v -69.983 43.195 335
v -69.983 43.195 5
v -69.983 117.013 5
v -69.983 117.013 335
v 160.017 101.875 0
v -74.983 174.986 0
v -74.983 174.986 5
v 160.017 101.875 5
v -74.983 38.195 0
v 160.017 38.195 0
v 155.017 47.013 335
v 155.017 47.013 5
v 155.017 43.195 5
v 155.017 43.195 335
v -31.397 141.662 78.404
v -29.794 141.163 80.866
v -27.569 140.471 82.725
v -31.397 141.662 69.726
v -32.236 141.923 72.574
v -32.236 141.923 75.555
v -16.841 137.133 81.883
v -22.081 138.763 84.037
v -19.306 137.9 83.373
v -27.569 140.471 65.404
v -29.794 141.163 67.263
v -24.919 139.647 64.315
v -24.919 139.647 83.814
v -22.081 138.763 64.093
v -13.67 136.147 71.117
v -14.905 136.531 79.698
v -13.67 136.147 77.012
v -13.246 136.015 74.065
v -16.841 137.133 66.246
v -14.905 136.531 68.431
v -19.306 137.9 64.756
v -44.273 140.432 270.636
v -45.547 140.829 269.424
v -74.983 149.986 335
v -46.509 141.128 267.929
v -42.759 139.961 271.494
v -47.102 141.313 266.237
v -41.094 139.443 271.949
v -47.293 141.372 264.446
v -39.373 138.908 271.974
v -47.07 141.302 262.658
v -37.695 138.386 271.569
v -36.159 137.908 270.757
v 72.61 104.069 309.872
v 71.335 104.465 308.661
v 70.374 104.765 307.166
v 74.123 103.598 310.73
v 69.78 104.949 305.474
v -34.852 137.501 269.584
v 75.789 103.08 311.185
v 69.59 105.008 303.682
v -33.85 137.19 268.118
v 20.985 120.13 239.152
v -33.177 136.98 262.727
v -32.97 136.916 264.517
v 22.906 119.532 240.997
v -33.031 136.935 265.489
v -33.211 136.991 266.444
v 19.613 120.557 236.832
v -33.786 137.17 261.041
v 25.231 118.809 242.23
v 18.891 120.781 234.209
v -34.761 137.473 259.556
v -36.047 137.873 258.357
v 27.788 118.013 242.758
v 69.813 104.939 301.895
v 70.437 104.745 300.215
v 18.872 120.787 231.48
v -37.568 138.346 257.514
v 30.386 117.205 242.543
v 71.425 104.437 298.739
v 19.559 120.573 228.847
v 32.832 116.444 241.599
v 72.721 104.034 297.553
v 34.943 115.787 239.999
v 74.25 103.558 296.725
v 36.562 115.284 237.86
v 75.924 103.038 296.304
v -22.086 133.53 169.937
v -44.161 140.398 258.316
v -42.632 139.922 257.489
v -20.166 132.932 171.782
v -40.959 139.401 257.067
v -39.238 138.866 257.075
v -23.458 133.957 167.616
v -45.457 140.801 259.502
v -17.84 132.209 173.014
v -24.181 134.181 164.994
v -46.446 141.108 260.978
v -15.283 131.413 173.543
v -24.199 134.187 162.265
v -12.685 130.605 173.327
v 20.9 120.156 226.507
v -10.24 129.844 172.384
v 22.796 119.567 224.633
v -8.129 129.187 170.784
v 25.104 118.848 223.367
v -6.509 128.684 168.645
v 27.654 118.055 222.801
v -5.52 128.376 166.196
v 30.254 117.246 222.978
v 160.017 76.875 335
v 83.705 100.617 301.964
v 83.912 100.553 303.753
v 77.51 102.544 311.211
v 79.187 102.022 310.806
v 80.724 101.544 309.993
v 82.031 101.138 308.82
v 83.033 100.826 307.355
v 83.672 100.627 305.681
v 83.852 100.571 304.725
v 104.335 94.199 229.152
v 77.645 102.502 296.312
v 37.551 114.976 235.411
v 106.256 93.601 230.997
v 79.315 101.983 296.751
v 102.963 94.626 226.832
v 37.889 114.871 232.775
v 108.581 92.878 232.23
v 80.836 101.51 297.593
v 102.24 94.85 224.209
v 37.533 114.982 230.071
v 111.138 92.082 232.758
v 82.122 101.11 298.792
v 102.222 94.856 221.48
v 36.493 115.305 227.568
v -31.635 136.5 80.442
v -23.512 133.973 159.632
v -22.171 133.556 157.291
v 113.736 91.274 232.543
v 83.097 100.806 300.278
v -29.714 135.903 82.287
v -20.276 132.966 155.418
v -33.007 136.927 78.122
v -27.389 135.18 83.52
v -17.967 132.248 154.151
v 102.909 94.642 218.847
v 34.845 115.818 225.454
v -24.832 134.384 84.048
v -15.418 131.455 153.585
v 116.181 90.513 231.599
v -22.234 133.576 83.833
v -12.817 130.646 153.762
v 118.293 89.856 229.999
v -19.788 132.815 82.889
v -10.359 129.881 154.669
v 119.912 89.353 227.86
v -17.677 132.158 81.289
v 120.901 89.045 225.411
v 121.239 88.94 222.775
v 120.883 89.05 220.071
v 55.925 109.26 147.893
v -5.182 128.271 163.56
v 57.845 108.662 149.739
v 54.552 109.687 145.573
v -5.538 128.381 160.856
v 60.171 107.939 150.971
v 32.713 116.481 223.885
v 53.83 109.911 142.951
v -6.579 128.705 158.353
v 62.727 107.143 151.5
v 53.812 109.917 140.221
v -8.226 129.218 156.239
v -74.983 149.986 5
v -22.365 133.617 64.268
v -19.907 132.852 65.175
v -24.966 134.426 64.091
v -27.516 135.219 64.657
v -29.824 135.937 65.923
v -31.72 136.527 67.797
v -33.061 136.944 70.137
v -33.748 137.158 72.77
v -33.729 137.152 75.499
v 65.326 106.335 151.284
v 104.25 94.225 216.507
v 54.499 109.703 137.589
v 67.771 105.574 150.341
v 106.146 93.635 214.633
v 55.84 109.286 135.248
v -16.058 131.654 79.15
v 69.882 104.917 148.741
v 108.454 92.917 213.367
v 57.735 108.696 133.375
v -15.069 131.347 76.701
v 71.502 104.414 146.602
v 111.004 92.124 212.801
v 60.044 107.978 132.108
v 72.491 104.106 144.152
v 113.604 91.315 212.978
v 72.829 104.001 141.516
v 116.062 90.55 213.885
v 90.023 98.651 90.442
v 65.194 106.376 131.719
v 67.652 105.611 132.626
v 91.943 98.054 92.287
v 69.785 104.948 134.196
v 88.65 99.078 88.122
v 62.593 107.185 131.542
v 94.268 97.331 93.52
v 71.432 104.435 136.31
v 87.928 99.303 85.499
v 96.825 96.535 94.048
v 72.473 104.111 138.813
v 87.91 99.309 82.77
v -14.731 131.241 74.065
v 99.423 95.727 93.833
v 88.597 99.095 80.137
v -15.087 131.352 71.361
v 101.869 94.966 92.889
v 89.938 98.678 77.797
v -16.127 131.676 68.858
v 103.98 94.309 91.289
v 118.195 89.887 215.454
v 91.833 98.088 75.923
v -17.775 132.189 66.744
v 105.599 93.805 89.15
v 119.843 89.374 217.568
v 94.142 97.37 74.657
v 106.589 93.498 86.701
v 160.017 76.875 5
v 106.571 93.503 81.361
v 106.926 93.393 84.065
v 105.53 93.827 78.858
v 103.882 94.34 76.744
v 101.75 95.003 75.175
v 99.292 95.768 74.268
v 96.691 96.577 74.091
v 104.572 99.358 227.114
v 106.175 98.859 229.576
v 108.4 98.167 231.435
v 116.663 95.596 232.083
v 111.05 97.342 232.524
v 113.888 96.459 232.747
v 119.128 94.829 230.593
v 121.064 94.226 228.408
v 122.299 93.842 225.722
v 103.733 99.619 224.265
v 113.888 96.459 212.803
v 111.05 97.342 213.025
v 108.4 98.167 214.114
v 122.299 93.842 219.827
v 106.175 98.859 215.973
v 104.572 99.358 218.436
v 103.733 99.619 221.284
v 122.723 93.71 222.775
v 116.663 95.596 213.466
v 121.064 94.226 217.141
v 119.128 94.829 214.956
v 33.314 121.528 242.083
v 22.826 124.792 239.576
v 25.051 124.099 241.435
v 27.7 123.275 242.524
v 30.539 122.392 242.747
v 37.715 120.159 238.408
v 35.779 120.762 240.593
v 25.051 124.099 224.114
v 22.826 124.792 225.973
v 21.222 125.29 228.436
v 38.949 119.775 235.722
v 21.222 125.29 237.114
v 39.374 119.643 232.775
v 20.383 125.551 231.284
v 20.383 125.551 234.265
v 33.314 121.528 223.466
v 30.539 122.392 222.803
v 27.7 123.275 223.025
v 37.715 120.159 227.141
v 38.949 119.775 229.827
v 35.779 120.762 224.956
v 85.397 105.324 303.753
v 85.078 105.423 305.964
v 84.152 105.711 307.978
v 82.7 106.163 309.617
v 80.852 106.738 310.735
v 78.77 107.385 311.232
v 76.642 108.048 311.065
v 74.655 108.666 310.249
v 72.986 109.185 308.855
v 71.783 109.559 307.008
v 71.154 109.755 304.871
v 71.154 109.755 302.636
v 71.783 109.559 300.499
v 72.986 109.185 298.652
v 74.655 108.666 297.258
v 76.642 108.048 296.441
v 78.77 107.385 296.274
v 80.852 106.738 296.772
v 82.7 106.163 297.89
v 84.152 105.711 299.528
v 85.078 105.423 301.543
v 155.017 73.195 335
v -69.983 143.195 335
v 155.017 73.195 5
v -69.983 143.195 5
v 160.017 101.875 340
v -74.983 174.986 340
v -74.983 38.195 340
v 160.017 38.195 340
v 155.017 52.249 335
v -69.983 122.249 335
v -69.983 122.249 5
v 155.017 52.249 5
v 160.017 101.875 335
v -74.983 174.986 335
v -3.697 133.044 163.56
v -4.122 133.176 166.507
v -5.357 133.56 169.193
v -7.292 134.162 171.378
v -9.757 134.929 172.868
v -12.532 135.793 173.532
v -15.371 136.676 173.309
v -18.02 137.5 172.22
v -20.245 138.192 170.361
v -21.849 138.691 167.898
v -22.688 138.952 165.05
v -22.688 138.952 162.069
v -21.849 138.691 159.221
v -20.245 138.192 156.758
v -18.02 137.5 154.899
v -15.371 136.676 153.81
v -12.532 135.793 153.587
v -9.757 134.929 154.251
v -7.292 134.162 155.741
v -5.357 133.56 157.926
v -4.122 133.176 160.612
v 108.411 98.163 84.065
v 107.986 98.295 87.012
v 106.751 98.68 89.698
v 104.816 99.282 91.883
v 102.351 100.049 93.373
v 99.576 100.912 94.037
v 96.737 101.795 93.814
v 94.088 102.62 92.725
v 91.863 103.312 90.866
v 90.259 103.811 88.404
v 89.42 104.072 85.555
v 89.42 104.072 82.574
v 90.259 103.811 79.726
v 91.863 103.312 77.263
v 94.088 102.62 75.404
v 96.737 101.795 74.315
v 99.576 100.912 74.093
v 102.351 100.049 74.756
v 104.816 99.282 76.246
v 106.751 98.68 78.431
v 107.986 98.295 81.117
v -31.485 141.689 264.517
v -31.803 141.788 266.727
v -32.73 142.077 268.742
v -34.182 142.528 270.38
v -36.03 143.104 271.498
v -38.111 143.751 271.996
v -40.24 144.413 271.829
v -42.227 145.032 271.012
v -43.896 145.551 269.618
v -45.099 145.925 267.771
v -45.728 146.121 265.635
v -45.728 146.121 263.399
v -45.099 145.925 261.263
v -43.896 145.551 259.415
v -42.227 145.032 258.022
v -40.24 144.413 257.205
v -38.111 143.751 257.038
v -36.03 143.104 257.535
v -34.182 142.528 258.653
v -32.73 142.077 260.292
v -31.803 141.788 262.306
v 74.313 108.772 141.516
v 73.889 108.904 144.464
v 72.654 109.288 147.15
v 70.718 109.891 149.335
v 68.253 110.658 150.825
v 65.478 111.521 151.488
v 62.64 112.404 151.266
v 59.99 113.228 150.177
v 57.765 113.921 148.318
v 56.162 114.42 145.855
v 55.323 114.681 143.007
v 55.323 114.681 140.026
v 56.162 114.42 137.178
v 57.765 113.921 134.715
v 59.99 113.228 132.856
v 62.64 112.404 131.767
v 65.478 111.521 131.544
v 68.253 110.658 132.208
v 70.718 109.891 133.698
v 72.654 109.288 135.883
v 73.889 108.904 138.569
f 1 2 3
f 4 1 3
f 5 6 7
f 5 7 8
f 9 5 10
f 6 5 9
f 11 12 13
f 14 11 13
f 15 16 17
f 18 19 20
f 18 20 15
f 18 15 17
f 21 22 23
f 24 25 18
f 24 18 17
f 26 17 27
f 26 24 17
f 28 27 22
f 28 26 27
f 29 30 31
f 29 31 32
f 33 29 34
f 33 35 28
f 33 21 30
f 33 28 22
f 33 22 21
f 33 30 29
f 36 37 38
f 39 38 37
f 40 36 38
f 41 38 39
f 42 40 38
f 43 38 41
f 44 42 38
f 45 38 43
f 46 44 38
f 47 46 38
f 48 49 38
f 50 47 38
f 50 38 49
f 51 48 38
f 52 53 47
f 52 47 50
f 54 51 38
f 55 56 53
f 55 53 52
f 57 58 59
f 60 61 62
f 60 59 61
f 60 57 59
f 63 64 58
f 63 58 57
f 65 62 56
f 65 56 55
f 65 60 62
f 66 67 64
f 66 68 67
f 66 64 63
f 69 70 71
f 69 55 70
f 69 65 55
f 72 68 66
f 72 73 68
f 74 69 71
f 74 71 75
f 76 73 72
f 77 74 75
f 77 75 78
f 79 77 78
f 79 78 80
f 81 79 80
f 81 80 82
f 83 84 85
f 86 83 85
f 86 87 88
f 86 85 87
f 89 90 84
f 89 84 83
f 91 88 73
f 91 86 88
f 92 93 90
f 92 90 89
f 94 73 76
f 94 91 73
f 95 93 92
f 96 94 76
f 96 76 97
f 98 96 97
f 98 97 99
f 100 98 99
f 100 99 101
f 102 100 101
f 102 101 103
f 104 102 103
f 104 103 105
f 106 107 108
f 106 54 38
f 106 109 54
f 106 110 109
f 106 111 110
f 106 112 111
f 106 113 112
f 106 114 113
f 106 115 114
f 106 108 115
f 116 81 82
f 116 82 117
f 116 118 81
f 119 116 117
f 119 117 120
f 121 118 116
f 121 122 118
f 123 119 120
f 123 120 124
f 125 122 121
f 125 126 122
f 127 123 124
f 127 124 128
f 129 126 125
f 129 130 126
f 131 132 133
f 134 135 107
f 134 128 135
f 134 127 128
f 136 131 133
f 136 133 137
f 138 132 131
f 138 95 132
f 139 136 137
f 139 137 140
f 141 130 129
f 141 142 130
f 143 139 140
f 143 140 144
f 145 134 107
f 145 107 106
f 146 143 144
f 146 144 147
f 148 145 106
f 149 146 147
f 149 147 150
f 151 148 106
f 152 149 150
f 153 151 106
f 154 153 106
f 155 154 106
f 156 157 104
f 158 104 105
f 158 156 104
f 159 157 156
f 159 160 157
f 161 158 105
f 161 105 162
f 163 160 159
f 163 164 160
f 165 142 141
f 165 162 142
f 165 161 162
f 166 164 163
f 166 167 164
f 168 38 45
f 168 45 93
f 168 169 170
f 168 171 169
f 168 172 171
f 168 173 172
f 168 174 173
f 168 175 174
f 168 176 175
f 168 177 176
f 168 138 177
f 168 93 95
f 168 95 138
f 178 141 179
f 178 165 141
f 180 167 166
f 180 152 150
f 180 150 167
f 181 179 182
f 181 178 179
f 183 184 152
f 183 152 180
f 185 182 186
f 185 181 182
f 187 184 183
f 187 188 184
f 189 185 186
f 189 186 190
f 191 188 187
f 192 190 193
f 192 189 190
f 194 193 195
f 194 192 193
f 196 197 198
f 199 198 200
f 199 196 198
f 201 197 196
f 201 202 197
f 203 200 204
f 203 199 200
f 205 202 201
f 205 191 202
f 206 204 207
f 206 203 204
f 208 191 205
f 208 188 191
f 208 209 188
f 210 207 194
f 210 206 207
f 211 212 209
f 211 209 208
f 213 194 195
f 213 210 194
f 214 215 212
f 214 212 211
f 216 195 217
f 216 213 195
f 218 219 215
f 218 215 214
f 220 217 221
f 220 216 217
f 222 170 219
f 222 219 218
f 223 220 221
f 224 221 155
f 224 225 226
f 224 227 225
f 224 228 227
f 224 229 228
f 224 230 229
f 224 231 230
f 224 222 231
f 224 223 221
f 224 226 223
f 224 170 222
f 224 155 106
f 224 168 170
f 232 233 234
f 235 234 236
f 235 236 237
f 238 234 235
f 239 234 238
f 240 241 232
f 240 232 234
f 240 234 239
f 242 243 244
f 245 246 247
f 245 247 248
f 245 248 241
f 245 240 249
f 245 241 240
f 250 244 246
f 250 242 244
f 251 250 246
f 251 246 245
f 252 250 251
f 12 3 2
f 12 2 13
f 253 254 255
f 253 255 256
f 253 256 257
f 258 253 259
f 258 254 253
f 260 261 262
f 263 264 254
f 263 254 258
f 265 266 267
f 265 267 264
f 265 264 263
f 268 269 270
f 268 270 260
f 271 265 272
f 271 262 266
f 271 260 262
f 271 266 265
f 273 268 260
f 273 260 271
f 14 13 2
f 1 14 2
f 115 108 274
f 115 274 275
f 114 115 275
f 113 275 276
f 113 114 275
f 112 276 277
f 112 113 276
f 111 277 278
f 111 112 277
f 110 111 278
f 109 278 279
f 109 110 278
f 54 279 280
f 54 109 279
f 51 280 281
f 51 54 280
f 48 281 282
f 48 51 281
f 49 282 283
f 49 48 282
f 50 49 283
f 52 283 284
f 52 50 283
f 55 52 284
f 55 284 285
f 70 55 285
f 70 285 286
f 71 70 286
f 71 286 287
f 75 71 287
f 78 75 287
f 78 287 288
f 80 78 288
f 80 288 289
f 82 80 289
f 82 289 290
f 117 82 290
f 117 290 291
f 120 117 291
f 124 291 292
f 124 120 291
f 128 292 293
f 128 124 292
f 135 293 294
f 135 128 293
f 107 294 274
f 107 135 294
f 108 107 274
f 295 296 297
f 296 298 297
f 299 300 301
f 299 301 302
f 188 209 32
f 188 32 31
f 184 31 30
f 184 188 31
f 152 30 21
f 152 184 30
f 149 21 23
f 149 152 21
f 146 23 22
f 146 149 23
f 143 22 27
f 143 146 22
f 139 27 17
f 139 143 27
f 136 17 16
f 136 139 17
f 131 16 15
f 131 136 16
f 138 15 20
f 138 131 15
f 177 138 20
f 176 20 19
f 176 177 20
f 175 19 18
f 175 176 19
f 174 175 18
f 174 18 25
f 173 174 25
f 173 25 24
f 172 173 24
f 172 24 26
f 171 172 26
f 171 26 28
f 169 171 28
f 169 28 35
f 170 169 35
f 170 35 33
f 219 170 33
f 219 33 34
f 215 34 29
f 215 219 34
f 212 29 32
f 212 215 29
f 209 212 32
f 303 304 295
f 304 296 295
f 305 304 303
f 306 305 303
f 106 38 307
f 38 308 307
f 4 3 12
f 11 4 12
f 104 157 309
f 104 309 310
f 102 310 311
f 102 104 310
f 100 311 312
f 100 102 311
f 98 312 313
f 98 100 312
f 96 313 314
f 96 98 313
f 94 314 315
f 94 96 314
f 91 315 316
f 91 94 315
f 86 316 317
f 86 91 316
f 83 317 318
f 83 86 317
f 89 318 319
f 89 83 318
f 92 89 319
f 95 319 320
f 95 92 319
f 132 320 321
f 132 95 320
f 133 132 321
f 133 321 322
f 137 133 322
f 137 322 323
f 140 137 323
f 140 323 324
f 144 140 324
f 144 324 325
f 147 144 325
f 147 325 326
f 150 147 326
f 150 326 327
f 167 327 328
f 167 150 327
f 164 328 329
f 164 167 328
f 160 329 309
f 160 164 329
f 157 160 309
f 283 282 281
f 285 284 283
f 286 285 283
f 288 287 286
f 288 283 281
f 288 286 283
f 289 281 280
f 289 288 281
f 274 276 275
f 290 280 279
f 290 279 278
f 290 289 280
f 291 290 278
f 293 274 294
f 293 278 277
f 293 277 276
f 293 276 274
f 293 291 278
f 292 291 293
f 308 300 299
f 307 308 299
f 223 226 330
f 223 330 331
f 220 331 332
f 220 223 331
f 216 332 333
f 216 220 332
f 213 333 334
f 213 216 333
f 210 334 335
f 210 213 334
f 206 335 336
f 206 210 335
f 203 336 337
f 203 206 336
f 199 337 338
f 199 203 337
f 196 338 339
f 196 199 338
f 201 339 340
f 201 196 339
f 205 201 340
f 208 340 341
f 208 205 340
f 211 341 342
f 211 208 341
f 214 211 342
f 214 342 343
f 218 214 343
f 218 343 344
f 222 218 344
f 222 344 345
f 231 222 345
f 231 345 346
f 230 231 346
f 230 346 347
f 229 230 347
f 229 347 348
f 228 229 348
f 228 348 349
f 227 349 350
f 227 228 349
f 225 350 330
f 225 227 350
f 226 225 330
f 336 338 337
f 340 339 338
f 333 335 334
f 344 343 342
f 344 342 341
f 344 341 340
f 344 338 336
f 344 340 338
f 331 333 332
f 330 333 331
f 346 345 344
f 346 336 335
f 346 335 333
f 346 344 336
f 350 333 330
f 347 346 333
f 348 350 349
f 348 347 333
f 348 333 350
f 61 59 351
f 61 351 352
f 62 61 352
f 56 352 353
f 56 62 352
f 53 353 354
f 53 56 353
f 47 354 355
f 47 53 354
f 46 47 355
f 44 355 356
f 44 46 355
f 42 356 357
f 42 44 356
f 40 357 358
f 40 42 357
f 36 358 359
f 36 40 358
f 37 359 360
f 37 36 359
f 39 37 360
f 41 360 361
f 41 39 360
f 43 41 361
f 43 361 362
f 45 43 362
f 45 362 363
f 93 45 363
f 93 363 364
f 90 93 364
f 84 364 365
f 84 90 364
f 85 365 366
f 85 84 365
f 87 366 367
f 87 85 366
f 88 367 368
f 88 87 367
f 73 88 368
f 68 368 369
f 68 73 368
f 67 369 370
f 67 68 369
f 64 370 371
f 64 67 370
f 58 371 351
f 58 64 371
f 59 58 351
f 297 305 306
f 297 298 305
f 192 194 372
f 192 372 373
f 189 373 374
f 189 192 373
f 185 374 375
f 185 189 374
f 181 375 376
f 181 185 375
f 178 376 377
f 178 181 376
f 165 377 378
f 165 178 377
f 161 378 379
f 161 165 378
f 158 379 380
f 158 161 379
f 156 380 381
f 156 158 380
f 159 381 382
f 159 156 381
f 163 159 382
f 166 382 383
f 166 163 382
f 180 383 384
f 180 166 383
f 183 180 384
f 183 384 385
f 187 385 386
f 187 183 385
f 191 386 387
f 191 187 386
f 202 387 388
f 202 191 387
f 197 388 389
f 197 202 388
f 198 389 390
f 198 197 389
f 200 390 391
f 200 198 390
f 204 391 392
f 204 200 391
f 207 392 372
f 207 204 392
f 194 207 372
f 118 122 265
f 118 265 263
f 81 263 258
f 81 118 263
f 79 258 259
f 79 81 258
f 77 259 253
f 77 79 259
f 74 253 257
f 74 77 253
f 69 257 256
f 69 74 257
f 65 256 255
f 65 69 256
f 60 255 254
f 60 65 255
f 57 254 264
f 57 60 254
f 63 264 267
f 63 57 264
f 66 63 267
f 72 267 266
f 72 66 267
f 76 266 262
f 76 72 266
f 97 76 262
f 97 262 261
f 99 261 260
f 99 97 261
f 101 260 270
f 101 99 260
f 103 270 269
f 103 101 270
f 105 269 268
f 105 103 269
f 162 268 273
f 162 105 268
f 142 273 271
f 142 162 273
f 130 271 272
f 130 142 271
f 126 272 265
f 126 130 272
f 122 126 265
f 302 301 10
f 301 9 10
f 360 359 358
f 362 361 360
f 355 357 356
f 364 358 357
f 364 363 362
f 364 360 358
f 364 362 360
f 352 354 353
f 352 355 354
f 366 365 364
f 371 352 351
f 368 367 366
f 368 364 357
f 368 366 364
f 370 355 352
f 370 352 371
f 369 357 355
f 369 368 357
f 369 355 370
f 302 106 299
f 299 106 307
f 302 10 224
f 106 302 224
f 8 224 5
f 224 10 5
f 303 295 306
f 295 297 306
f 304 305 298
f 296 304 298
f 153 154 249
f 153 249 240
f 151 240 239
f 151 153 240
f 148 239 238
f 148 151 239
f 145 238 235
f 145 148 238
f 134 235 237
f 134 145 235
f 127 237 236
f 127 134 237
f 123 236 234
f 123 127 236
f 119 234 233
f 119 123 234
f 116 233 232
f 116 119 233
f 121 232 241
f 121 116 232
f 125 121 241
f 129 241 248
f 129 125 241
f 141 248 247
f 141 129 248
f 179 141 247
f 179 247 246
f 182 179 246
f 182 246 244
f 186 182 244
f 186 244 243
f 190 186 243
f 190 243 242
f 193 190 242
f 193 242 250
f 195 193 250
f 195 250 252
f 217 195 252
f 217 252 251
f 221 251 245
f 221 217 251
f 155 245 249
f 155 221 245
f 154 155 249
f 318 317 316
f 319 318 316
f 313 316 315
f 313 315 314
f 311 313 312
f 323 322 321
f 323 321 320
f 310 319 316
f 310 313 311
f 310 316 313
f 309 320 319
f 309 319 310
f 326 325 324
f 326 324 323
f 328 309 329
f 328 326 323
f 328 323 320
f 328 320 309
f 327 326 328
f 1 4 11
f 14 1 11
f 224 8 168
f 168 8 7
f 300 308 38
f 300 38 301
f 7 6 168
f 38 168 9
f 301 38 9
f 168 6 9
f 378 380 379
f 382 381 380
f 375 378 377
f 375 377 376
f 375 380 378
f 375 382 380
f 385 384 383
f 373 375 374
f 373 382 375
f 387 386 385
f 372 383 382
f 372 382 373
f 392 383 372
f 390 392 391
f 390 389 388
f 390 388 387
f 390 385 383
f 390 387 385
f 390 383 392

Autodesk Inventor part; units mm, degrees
ref_plane "YZ Plane" through (0, 0, 0) normal (1, 0, 0) x (0, 1, 0)
ref_plane "XZ Plane" through (0, 0, 0) normal (0, 1, 0) x (-1, 0, 0)
ref_plane "XY Plane" through (0, 0, 0) normal (0, 0, 1) x (1, 0, 0)
sketch "Sketch1" plane through (0, 0, 0) normal (0, 0, 1) x (1, 0, 0)
  line L0 (-69.9828, 73.1946) -> (155.0172, 73.1946)
  line L1 (155.0172, 73.1946) -> (155.0172, 43.1946)
  line L2 (155.0172, 43.1946) -> (-69.9828, 43.1946)
  line L3 (-69.9828, 43.1946) -> (-69.9828, 73.1946)
  line L4 (-69.9828, 73.1946) -> (-69.9828, 143.1946)
  line L5 (-69.9828, 143.1946) -> (155.0172, 73.1946)
  line L6 (-74.9828, 93.1946) -> (-74.9828, 38.1946)
  line L7 (-74.9828, 38.1946) -> (160.0172, 38.1946)
  line L8 (160.0172, 38.1946) -> (160.0172, 76.8754)
  line L9 (-74.9828, 73.1946) -> (-74.9828, 149.9865)
  line L10 (-74.9828, 149.9865) -> (160.0172, 76.8754)
  line L11 (-69.9828, 143.1946) -> (-74.9828, 143.1946)
  line L12 (155.0172, 73.1946) -> (160.0172, 73.1946)
  line L13 (-69.9828, 73.1946) -> (-74.9828, 73.1946)
  point P0 (0, 0)
  point P1 (-74.9828, 93.1946)
  dimension "d0" = 225
  dimension "d1" = 30
  dimension "d2" = 70
  dimension "d3" = 5
  dimension "d4" = 5
  dimension "d32" = 5
extrude "Extrusion1" add sketch "Sketch1" along normal blind 340 contours L13 L6 L9 L11 L4 | L3 L2 L1 L12 L8 L7 L6 L13 | L5 L11 L9 L10 L8 L12
extrude "Extrusion2" add sketch "Sketch1" along normal blind 340 contours L4 L5 L0 | L0 L1 L2 L3
extrude "Extrusion3" cut sketch "Sketch1" along normal blind 335 contours L4 L5 L0 | L0 L1 L2 L3
extrude "Extrusion4" add sketch "Sketch1" along normal blind 5 contours L4 L5 L0 | L0 L1 L2 L3
sketch "Sketch2" plane through (-74.9828, 149.9865, 340) normal (0.2971, 0.9549, 0) x (0.9549, -0.2971, 0)
  line L0 (36.4986, 335) -> (36.4986, 5) projected
  circle A0 centre (36.4986, 75.4833) radius 7.5
  circle A1 centre (53.1004, 265.9353) radius 10
  circle A2 centre (108.208, 107.2253) radius 10
  circle A3 centre (63.1004, 176.4405) radius 10
  circle A4 centre (158.9071, 36.2466) radius 7.5
  circle A5 centre (180.5093, 255.9353) radius 10
  circle A6 centre (144.7995, 198.4836) radius 10
  circle A7 centre (195.4985, 117.2253) radius 10
  point P0 (116.1538, 340)
  dimension "d13" = 15
  dimension "d14" = 20
  dimension "d15" = 20
  dimension "d16" = 20
  dimension "d17" = 15
  dimension "d18" = 20
  dimension "d19" = 20
  dimension "d20" = 20
extrude "Extrusion5" add sketch "Sketch2" along normal blind 5
sketch "Sketch3" plane through (0, 0, 340) normal (0, 0, 1) x (1, 0, 0)
  line L0 (-69.9828, 143.1946) -> (158.5319, 72.1011)
  line L1 (160.0172, 76.8754) -> (-74.9828, 149.9865) projected
  line L2 (-75.9241, 124.0974) -> (155.0172, 52.249)
  line L3 (-69.9828, 143.1946) -> (-69.9828, 122.249)
  line L4 (-69.9828, 43.1946) -> (-69.9828, 143.1946) projected
  line L5 (155.0172, 43.1946) -> (155.0172, 73.1946) projected
  line L6 (155.0172, 73.1946) -> (155.0172, 52.249)
  line L7 (-74.9828, 149.9865) -> (-74.9828, 174.9865)
  line L8 (-74.9828, 174.9865) -> (160.0172, 101.8754)
  line L9 (-69.9828, 143.1946) -> (155.0172, 73.1946) projected
  line L10 (160.0172, 76.8754) -> (160.0172, 101.8754)
  line L11 (-77.4095, 119.3231) -> (160.0172, 45.4571)
  line L12 (160.0172, 45.4571) -> (160.0172, 93.1946)
  line L13 (-69.9828, 122.249) -> (-69.9828, 117.0126)
  line L14 (155.0172, 52.249) -> (155.0172, 47.0126)
  point P0 (0, 0)
  dimension "d23" = 20
  dimension "d24" = 25
  dimension "d25" = 5
extrude "Extrusion6" add sketch "Sketch3" against normal blind 340 contours L2 L5 L11 L4
extrude "Extrusion7" add sketch "Sketch3" against normal blind 5 contours L1 L7 L8 L10
sketch "Sketch4" plane through (0, 0, 0) normal (0, 0, -1) x (-1, 0, 0)
  line L0 (74.9828, 174.9865) -> (74.9828, 38.1946) projected
  line L1 (74.9828, 169.9638) -> (74.9828, 174.9865)
  line L2 (-160.0172, 38.1946) -> (-160.0172, 101.8754) projected
  line L3 (74.9828, 174.9865) -> (-160.0172, 101.8754)
  line L4 (-160.0172, 101.8754) -> (-160.0172, 91.5878)
  line L5 (-160.0172, 76.8754) -> (74.9828, 149.9865) projected
  line L6 (74.9828, 149.9865) -> (-160.0172, 76.8754)
  point P0 (0, 0)
extrude "Extrusion8" add sketch "Sketch4" against normal blind 5
properties part number "newcollection"
